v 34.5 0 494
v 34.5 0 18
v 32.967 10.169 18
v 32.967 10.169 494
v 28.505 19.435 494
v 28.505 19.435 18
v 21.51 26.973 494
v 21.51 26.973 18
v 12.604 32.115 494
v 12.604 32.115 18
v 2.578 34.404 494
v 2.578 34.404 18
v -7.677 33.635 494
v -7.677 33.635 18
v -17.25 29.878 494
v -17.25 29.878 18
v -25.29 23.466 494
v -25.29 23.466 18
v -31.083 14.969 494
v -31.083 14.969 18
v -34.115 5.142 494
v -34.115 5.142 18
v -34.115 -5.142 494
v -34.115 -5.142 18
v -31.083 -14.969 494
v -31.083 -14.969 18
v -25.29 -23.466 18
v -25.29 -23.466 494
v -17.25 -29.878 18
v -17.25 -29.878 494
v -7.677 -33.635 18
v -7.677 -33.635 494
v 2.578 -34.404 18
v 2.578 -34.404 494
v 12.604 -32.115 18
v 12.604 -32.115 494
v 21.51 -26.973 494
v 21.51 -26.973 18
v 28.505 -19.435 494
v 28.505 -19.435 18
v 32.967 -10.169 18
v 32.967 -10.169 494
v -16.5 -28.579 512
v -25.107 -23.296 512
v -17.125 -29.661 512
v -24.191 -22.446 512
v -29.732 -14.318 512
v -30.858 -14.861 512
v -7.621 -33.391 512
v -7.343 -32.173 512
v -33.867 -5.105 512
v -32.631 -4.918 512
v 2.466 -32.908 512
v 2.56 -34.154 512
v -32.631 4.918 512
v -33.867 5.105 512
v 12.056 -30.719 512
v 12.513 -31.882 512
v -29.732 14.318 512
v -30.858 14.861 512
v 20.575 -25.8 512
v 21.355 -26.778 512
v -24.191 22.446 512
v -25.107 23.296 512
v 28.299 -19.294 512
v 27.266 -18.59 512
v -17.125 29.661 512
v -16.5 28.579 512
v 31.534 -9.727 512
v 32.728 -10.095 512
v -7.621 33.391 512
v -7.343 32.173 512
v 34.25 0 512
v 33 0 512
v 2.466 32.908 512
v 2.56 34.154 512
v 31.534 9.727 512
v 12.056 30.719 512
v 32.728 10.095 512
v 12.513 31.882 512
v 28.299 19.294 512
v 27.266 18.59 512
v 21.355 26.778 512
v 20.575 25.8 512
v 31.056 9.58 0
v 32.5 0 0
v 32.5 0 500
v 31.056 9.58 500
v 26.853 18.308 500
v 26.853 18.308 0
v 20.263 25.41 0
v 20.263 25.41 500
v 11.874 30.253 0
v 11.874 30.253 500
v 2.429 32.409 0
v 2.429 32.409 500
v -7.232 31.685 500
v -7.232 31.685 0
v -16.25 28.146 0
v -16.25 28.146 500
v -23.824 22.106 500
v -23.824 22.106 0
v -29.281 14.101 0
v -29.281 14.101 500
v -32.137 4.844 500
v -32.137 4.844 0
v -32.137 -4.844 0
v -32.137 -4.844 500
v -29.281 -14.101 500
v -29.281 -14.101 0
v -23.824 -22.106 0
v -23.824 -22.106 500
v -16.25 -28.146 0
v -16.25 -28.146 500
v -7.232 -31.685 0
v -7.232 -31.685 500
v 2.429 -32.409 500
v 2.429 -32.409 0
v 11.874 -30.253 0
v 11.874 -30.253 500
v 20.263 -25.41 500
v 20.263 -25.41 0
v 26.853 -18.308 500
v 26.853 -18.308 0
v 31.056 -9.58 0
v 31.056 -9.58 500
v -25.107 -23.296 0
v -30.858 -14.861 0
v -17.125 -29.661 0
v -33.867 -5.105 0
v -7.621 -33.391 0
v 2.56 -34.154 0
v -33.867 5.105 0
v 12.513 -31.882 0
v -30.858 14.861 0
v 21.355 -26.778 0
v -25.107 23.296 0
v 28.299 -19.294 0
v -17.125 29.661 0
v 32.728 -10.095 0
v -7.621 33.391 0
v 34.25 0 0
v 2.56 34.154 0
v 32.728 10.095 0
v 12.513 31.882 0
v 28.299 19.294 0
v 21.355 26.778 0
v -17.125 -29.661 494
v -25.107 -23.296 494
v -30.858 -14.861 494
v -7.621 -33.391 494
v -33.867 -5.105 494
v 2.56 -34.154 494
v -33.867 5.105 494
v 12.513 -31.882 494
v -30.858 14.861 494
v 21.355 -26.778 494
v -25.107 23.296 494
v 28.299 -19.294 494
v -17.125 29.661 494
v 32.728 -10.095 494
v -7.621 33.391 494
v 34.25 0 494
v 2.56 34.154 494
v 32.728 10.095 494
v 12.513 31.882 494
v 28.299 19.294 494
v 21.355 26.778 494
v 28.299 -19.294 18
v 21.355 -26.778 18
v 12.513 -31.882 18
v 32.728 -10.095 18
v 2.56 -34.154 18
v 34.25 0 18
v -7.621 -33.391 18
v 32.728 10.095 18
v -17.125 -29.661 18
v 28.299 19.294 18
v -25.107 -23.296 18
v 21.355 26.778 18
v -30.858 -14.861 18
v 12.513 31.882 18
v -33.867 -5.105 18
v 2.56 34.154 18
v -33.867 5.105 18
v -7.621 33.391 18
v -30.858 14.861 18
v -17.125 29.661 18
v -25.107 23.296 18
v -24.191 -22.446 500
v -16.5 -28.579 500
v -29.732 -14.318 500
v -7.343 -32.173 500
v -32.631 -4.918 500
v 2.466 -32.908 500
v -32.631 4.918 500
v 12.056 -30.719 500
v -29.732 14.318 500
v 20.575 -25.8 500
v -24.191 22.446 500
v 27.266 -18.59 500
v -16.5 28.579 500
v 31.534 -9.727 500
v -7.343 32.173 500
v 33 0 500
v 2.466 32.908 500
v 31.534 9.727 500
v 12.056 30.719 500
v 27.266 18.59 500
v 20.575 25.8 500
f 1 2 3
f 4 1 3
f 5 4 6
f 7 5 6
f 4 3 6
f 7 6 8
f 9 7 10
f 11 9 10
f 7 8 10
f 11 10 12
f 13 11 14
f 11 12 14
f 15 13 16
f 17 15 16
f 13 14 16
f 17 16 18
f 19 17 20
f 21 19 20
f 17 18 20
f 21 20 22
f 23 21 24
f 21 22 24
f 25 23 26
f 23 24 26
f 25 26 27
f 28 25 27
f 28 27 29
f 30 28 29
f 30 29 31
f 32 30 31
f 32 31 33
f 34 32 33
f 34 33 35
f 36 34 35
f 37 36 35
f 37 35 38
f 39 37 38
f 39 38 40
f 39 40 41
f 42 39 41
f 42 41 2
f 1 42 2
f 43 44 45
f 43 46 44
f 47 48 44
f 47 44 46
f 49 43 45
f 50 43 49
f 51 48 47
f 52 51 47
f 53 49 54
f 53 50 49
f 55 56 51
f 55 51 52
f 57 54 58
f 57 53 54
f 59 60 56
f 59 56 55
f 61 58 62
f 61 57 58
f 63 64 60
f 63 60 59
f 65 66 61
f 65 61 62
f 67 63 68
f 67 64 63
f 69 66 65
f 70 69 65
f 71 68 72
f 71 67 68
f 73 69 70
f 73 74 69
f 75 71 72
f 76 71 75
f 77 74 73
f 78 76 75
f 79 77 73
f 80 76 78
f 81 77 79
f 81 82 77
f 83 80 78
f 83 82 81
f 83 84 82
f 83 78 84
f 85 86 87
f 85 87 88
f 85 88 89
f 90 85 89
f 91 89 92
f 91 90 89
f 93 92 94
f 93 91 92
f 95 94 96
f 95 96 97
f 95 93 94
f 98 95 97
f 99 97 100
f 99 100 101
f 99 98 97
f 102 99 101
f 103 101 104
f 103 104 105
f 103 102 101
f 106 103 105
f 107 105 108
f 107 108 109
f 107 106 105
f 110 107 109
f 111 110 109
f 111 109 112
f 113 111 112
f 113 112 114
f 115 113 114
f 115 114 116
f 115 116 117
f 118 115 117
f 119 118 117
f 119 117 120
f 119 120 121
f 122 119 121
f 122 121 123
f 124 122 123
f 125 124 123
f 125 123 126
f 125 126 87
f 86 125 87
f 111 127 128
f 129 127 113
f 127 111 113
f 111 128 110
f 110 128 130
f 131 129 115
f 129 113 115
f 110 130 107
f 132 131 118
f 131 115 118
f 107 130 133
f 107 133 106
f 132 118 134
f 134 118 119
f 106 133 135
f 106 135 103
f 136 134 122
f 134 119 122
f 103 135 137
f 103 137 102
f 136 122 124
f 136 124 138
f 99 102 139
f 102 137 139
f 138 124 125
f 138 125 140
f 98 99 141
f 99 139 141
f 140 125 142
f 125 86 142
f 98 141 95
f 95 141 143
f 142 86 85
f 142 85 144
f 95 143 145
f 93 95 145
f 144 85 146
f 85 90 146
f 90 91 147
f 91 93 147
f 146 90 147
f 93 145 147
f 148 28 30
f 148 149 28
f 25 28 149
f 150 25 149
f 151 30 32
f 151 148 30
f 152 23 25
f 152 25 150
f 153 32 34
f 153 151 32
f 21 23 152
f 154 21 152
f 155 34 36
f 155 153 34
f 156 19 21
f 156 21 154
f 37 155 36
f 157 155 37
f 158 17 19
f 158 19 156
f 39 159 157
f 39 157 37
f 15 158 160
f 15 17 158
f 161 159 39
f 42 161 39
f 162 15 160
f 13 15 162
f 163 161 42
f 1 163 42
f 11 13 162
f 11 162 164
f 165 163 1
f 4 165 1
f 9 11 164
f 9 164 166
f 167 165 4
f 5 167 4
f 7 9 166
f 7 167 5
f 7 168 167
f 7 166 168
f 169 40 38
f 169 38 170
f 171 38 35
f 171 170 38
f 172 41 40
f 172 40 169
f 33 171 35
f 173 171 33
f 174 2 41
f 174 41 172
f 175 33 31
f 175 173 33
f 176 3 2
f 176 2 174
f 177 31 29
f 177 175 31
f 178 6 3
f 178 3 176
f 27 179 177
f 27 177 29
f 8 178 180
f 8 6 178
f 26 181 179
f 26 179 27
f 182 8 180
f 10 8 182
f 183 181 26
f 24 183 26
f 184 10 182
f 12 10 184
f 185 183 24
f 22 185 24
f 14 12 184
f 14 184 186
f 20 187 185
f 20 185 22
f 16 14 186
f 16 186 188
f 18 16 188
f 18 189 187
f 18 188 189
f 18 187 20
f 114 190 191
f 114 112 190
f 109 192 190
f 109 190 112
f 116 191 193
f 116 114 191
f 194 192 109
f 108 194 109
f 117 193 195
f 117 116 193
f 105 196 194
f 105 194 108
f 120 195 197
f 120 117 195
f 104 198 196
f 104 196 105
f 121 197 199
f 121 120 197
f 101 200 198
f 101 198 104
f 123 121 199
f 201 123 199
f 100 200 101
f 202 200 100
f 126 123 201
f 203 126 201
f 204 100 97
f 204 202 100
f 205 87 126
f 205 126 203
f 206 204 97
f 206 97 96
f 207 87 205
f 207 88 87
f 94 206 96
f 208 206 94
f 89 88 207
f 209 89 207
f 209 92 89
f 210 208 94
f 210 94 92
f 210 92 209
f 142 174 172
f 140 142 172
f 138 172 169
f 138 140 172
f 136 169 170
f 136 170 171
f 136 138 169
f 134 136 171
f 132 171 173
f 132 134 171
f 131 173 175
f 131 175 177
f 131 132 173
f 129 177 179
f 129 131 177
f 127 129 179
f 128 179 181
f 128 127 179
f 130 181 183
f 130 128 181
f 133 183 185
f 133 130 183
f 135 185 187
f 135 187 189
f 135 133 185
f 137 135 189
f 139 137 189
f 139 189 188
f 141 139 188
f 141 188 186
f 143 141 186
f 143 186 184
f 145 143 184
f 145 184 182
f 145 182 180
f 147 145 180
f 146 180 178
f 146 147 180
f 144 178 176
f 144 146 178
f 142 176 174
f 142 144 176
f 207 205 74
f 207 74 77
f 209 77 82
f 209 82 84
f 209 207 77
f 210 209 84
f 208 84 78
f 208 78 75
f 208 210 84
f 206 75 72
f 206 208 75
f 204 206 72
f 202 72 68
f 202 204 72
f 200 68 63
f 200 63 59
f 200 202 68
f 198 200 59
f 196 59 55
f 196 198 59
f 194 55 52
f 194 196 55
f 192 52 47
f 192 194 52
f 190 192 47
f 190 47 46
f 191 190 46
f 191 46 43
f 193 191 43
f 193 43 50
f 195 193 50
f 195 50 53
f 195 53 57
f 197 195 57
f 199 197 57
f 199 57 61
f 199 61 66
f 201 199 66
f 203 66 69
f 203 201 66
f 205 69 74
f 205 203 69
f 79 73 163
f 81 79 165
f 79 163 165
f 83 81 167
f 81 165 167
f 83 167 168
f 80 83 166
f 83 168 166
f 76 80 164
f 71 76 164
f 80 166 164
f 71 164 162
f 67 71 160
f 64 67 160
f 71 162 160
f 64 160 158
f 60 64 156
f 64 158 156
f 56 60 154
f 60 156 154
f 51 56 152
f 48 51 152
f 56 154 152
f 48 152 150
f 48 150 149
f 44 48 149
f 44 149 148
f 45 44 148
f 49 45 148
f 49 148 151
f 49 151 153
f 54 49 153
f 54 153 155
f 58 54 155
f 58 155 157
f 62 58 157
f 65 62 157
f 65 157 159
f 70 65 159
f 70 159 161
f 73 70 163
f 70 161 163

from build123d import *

# Parameters (mm, degrees)
SKETCH1_R           = 34.5
SKETCH1_R_2         = 32.5
BOSS_EXTRUDE1_DEPTH = 512
CUT_EXTRUDE1_START  = -12
SKETCH3_R           = 33
SKETCH3_R_2         = 32.5
CUT_EXTRUDE1_DEPTH  = 12
CUT_EXTRUDE3_START  = -18
SKETCH4_R           = 34.5
SKETCH4_R_2         = 34.25
CUT_EXTRUDE3_DEPTH  = 18
SKETCH5_R           = 34.5
SKETCH5_R_2         = 34.25
CUT_EXTRUDE4_DEPTH  = 18


with BuildPart() as part:
    # Sketch1 → Boss-Extrude1 (new body)
    with BuildSketch(Plane.XY):
        Circle(SKETCH1_R)
        Circle(SKETCH1_R_2, mode=Mode.SUBTRACT)
    extrude(amount=BOSS_EXTRUDE1_DEPTH)

    # Sketch3 → Cut-Extrude1 (cut)
    with BuildSketch(Plane.XY.offset(512).offset(CUT_EXTRUDE1_START)):
        Circle(SKETCH3_R)
        Circle(SKETCH3_R_2, mode=Mode.SUBTRACT)
    extrude(amount=CUT_EXTRUDE1_DEPTH, mode=Mode.SUBTRACT)

    # Sketch4 → Cut-Extrude3 (cut)
    with BuildSketch(Plane.XY.offset(512).offset(CUT_EXTRUDE3_START)):
        Circle(SKETCH4_R)
        Circle(SKETCH4_R_2, mode=Mode.SUBTRACT)
    extrude(amount=CUT_EXTRUDE3_DEPTH, mode=Mode.SUBTRACT)

    # Sketch5 → Cut-Extrude4 (cut)
    with BuildSketch(Plane(origin=(0, 0, 0), x_dir=(-1, 0, 0), z_dir=(0, 0, -1))):
        Circle(SKETCH5_R)
        with Locations(Location((0, 0, 0), (0, 0, 180))):
            Circle(SKETCH5_R_2, mode=Mode.SUBTRACT)
    extrude(amount=-CUT_EXTRUDE4_DEPTH, mode=Mode.SUBTRACT)


solid = part.part
